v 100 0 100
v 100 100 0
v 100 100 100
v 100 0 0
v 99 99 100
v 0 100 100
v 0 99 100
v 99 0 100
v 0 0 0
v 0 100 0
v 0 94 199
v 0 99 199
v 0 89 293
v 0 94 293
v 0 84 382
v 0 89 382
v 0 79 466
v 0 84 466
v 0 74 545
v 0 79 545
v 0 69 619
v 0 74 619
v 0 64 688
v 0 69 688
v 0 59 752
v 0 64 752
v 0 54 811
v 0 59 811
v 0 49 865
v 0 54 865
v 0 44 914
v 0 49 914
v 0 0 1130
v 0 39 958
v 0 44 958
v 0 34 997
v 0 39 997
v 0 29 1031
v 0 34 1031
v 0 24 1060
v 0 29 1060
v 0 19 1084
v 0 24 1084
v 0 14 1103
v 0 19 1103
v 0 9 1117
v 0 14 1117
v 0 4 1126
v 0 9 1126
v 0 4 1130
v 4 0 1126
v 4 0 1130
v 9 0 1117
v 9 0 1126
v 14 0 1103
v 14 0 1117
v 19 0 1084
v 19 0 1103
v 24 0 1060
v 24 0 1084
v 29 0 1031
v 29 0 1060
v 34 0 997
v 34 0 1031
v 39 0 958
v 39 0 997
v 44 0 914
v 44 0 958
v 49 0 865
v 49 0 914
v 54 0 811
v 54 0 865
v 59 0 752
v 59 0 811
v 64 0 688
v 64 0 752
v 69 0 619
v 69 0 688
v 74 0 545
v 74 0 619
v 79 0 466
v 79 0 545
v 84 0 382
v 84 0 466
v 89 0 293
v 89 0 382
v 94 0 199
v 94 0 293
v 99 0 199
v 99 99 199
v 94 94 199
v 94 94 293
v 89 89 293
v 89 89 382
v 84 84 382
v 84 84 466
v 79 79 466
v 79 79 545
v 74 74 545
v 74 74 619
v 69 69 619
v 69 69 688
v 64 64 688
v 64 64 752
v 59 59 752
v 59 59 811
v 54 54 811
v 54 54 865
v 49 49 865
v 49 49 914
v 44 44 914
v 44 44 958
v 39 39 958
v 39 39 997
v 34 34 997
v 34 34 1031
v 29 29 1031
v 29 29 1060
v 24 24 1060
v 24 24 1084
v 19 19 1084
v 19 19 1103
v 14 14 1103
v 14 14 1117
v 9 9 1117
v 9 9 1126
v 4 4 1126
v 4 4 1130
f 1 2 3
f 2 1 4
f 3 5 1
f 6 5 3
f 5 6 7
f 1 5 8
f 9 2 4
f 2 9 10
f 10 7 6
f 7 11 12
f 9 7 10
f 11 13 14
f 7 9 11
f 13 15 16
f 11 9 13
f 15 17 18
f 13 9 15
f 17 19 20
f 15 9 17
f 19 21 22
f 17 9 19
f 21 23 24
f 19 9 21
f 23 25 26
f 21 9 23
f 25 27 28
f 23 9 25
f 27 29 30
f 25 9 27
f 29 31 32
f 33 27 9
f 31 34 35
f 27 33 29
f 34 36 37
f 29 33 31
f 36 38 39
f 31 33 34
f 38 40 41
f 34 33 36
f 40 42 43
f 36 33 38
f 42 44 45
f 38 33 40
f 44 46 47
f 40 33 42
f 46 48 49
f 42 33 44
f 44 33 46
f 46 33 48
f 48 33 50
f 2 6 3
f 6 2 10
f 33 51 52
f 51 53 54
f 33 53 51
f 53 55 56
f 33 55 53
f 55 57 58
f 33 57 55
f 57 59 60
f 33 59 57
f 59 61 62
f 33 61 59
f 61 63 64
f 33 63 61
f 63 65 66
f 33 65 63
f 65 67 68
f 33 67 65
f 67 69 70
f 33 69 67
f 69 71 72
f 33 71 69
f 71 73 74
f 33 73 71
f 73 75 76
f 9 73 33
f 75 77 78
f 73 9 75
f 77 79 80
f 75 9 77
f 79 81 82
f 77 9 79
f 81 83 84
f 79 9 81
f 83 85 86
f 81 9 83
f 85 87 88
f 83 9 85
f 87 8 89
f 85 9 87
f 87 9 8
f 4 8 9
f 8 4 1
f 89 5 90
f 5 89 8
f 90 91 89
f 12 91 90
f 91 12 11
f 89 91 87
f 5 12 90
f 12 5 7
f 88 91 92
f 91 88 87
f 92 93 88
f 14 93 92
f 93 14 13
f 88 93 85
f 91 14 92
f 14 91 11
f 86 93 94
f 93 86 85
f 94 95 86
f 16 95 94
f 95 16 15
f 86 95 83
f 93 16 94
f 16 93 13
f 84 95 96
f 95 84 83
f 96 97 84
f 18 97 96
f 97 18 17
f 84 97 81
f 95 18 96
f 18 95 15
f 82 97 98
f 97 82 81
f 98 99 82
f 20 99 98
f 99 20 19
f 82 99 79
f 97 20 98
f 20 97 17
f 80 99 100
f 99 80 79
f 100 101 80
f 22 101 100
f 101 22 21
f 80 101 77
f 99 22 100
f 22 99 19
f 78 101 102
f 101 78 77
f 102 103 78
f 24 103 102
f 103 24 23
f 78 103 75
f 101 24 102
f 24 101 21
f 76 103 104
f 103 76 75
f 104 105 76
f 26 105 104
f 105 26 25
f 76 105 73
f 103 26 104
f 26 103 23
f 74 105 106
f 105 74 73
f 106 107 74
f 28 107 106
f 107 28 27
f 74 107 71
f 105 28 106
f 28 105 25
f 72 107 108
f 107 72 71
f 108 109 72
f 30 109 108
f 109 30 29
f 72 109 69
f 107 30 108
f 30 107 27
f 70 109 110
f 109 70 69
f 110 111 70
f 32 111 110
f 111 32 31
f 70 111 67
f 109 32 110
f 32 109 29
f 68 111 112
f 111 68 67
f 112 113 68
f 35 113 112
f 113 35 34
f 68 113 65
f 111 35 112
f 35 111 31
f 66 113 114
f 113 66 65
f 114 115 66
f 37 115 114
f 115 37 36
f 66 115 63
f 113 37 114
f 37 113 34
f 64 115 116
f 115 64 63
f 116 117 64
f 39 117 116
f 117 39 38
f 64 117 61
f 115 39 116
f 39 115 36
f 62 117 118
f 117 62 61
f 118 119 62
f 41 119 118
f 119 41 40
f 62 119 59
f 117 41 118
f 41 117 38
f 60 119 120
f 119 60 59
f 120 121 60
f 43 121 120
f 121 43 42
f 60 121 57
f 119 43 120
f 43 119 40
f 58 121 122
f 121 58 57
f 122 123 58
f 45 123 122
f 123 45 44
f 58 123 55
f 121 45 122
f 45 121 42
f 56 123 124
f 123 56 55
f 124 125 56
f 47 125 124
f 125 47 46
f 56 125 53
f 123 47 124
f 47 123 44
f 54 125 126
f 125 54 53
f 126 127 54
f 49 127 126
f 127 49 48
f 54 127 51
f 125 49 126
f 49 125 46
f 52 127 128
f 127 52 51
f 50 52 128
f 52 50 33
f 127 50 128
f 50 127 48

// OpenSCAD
union(){
    cube(size=[100, 100, 100]);
    translate(v=[0, 0, 100]){
        cube(size=[99, 99, 99]);
    };
    translate(v=[0, 0, 199]){
        cube(size=[94, 94, 94]);
    };
    translate(v=[0, 0, 293]){
        cube(size=[89, 89, 89]);
    };
    translate(v=[0, 0, 382]){
        cube(size=[84, 84, 84]);
    };
    translate(v=[0, 0, 466]){
        cube(size=[79, 79, 79]);
    };
    translate(v=[0, 0, 545]){
        cube(size=[74, 74, 74]);
    };
    translate(v=[0, 0, 619]){
        cube(size=[69, 69, 69]);
    };
    translate(v=[0, 0, 688]){
        cube(size=[64, 64, 64]);
    };
    translate(v=[0, 0, 752]){
        cube(size=[59, 59, 59]);
    };
    translate(v=[0, 0, 811]){
        cube(size=[54, 54, 54]);
    };
    translate(v=[0, 0, 865]){
        cube(size=[49, 49, 49]);
    };
    translate(v=[0, 0, 914]){
        cube(size=[44, 44, 44]);
    };
    translate(v=[0, 0, 958]){
        cube(size=[39, 39, 39]);
    };
    translate(v=[0, 0, 997]){
        cube(size=[34, 34, 34]);
    };
    translate(v=[0, 0, 1031]){
        cube(size=[29, 29, 29]);
    };
    translate(v=[0, 0, 1060]){
        cube(size=[24, 24, 24]);
    };
    translate(v=[0, 0, 1084]){
        cube(size=[19, 19, 19]);
    };
    translate(v=[0, 0, 1103]){
        cube(size=[14, 14, 14]);
    };
    translate(v=[0, 0, 1117]){
        cube(size=[9, 9, 9]);
    };
    translate(v=[0, 0, 1126]){
        cube(size=[4, 4, 4]);
    };
};
